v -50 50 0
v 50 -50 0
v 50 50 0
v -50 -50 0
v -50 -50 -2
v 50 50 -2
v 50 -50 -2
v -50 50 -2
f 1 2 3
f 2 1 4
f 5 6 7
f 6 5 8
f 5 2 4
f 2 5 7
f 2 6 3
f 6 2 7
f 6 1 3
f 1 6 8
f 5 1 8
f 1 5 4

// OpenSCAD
// =====================================================================
// RELIEVE 3D DESDE IMAGEN — Vorea Studio
// =====================================================================
// 1. Subí una imagen usando el botón 📷 del viewport
// 2. Compilá el modelo — el relieve se genera automáticamente
// Blanco = alto, Negro = bajo (o invertí con el parámetro)

// [min:1, max:30] Altura máxima del relieve (mm)
max_h = 10;

// [min:20, max:300] Ancho de la placa (mm)
ancho = 100;

// [min:20, max:300] Largo de la placa (mm)
largo = 100;

// [min:20, max:1000] Resolución de la grilla (más = más detalle)
resolucion = 200;

// [true, false] Invertir brillo (negro = alto)
invertir = false;

// [true, false] Generar sólido cerrado (base + paredes)
solido = true;

// [min:1, max:5] Grosor de la base (mm)
base = 2;

$fn = 24;

// ─── Placa base ──────────────────────────────────────────────────────
translate([-ancho/2, -largo/2, -base])
    cube([ancho, largo, base]);

// ─── Superficie de relieve ──────────────────────────────────────────
surface("surface_image", center=true, invert=invertir, maxheight=max_h, size=[ancho, largo], samples=resolucion, solid=solido);
